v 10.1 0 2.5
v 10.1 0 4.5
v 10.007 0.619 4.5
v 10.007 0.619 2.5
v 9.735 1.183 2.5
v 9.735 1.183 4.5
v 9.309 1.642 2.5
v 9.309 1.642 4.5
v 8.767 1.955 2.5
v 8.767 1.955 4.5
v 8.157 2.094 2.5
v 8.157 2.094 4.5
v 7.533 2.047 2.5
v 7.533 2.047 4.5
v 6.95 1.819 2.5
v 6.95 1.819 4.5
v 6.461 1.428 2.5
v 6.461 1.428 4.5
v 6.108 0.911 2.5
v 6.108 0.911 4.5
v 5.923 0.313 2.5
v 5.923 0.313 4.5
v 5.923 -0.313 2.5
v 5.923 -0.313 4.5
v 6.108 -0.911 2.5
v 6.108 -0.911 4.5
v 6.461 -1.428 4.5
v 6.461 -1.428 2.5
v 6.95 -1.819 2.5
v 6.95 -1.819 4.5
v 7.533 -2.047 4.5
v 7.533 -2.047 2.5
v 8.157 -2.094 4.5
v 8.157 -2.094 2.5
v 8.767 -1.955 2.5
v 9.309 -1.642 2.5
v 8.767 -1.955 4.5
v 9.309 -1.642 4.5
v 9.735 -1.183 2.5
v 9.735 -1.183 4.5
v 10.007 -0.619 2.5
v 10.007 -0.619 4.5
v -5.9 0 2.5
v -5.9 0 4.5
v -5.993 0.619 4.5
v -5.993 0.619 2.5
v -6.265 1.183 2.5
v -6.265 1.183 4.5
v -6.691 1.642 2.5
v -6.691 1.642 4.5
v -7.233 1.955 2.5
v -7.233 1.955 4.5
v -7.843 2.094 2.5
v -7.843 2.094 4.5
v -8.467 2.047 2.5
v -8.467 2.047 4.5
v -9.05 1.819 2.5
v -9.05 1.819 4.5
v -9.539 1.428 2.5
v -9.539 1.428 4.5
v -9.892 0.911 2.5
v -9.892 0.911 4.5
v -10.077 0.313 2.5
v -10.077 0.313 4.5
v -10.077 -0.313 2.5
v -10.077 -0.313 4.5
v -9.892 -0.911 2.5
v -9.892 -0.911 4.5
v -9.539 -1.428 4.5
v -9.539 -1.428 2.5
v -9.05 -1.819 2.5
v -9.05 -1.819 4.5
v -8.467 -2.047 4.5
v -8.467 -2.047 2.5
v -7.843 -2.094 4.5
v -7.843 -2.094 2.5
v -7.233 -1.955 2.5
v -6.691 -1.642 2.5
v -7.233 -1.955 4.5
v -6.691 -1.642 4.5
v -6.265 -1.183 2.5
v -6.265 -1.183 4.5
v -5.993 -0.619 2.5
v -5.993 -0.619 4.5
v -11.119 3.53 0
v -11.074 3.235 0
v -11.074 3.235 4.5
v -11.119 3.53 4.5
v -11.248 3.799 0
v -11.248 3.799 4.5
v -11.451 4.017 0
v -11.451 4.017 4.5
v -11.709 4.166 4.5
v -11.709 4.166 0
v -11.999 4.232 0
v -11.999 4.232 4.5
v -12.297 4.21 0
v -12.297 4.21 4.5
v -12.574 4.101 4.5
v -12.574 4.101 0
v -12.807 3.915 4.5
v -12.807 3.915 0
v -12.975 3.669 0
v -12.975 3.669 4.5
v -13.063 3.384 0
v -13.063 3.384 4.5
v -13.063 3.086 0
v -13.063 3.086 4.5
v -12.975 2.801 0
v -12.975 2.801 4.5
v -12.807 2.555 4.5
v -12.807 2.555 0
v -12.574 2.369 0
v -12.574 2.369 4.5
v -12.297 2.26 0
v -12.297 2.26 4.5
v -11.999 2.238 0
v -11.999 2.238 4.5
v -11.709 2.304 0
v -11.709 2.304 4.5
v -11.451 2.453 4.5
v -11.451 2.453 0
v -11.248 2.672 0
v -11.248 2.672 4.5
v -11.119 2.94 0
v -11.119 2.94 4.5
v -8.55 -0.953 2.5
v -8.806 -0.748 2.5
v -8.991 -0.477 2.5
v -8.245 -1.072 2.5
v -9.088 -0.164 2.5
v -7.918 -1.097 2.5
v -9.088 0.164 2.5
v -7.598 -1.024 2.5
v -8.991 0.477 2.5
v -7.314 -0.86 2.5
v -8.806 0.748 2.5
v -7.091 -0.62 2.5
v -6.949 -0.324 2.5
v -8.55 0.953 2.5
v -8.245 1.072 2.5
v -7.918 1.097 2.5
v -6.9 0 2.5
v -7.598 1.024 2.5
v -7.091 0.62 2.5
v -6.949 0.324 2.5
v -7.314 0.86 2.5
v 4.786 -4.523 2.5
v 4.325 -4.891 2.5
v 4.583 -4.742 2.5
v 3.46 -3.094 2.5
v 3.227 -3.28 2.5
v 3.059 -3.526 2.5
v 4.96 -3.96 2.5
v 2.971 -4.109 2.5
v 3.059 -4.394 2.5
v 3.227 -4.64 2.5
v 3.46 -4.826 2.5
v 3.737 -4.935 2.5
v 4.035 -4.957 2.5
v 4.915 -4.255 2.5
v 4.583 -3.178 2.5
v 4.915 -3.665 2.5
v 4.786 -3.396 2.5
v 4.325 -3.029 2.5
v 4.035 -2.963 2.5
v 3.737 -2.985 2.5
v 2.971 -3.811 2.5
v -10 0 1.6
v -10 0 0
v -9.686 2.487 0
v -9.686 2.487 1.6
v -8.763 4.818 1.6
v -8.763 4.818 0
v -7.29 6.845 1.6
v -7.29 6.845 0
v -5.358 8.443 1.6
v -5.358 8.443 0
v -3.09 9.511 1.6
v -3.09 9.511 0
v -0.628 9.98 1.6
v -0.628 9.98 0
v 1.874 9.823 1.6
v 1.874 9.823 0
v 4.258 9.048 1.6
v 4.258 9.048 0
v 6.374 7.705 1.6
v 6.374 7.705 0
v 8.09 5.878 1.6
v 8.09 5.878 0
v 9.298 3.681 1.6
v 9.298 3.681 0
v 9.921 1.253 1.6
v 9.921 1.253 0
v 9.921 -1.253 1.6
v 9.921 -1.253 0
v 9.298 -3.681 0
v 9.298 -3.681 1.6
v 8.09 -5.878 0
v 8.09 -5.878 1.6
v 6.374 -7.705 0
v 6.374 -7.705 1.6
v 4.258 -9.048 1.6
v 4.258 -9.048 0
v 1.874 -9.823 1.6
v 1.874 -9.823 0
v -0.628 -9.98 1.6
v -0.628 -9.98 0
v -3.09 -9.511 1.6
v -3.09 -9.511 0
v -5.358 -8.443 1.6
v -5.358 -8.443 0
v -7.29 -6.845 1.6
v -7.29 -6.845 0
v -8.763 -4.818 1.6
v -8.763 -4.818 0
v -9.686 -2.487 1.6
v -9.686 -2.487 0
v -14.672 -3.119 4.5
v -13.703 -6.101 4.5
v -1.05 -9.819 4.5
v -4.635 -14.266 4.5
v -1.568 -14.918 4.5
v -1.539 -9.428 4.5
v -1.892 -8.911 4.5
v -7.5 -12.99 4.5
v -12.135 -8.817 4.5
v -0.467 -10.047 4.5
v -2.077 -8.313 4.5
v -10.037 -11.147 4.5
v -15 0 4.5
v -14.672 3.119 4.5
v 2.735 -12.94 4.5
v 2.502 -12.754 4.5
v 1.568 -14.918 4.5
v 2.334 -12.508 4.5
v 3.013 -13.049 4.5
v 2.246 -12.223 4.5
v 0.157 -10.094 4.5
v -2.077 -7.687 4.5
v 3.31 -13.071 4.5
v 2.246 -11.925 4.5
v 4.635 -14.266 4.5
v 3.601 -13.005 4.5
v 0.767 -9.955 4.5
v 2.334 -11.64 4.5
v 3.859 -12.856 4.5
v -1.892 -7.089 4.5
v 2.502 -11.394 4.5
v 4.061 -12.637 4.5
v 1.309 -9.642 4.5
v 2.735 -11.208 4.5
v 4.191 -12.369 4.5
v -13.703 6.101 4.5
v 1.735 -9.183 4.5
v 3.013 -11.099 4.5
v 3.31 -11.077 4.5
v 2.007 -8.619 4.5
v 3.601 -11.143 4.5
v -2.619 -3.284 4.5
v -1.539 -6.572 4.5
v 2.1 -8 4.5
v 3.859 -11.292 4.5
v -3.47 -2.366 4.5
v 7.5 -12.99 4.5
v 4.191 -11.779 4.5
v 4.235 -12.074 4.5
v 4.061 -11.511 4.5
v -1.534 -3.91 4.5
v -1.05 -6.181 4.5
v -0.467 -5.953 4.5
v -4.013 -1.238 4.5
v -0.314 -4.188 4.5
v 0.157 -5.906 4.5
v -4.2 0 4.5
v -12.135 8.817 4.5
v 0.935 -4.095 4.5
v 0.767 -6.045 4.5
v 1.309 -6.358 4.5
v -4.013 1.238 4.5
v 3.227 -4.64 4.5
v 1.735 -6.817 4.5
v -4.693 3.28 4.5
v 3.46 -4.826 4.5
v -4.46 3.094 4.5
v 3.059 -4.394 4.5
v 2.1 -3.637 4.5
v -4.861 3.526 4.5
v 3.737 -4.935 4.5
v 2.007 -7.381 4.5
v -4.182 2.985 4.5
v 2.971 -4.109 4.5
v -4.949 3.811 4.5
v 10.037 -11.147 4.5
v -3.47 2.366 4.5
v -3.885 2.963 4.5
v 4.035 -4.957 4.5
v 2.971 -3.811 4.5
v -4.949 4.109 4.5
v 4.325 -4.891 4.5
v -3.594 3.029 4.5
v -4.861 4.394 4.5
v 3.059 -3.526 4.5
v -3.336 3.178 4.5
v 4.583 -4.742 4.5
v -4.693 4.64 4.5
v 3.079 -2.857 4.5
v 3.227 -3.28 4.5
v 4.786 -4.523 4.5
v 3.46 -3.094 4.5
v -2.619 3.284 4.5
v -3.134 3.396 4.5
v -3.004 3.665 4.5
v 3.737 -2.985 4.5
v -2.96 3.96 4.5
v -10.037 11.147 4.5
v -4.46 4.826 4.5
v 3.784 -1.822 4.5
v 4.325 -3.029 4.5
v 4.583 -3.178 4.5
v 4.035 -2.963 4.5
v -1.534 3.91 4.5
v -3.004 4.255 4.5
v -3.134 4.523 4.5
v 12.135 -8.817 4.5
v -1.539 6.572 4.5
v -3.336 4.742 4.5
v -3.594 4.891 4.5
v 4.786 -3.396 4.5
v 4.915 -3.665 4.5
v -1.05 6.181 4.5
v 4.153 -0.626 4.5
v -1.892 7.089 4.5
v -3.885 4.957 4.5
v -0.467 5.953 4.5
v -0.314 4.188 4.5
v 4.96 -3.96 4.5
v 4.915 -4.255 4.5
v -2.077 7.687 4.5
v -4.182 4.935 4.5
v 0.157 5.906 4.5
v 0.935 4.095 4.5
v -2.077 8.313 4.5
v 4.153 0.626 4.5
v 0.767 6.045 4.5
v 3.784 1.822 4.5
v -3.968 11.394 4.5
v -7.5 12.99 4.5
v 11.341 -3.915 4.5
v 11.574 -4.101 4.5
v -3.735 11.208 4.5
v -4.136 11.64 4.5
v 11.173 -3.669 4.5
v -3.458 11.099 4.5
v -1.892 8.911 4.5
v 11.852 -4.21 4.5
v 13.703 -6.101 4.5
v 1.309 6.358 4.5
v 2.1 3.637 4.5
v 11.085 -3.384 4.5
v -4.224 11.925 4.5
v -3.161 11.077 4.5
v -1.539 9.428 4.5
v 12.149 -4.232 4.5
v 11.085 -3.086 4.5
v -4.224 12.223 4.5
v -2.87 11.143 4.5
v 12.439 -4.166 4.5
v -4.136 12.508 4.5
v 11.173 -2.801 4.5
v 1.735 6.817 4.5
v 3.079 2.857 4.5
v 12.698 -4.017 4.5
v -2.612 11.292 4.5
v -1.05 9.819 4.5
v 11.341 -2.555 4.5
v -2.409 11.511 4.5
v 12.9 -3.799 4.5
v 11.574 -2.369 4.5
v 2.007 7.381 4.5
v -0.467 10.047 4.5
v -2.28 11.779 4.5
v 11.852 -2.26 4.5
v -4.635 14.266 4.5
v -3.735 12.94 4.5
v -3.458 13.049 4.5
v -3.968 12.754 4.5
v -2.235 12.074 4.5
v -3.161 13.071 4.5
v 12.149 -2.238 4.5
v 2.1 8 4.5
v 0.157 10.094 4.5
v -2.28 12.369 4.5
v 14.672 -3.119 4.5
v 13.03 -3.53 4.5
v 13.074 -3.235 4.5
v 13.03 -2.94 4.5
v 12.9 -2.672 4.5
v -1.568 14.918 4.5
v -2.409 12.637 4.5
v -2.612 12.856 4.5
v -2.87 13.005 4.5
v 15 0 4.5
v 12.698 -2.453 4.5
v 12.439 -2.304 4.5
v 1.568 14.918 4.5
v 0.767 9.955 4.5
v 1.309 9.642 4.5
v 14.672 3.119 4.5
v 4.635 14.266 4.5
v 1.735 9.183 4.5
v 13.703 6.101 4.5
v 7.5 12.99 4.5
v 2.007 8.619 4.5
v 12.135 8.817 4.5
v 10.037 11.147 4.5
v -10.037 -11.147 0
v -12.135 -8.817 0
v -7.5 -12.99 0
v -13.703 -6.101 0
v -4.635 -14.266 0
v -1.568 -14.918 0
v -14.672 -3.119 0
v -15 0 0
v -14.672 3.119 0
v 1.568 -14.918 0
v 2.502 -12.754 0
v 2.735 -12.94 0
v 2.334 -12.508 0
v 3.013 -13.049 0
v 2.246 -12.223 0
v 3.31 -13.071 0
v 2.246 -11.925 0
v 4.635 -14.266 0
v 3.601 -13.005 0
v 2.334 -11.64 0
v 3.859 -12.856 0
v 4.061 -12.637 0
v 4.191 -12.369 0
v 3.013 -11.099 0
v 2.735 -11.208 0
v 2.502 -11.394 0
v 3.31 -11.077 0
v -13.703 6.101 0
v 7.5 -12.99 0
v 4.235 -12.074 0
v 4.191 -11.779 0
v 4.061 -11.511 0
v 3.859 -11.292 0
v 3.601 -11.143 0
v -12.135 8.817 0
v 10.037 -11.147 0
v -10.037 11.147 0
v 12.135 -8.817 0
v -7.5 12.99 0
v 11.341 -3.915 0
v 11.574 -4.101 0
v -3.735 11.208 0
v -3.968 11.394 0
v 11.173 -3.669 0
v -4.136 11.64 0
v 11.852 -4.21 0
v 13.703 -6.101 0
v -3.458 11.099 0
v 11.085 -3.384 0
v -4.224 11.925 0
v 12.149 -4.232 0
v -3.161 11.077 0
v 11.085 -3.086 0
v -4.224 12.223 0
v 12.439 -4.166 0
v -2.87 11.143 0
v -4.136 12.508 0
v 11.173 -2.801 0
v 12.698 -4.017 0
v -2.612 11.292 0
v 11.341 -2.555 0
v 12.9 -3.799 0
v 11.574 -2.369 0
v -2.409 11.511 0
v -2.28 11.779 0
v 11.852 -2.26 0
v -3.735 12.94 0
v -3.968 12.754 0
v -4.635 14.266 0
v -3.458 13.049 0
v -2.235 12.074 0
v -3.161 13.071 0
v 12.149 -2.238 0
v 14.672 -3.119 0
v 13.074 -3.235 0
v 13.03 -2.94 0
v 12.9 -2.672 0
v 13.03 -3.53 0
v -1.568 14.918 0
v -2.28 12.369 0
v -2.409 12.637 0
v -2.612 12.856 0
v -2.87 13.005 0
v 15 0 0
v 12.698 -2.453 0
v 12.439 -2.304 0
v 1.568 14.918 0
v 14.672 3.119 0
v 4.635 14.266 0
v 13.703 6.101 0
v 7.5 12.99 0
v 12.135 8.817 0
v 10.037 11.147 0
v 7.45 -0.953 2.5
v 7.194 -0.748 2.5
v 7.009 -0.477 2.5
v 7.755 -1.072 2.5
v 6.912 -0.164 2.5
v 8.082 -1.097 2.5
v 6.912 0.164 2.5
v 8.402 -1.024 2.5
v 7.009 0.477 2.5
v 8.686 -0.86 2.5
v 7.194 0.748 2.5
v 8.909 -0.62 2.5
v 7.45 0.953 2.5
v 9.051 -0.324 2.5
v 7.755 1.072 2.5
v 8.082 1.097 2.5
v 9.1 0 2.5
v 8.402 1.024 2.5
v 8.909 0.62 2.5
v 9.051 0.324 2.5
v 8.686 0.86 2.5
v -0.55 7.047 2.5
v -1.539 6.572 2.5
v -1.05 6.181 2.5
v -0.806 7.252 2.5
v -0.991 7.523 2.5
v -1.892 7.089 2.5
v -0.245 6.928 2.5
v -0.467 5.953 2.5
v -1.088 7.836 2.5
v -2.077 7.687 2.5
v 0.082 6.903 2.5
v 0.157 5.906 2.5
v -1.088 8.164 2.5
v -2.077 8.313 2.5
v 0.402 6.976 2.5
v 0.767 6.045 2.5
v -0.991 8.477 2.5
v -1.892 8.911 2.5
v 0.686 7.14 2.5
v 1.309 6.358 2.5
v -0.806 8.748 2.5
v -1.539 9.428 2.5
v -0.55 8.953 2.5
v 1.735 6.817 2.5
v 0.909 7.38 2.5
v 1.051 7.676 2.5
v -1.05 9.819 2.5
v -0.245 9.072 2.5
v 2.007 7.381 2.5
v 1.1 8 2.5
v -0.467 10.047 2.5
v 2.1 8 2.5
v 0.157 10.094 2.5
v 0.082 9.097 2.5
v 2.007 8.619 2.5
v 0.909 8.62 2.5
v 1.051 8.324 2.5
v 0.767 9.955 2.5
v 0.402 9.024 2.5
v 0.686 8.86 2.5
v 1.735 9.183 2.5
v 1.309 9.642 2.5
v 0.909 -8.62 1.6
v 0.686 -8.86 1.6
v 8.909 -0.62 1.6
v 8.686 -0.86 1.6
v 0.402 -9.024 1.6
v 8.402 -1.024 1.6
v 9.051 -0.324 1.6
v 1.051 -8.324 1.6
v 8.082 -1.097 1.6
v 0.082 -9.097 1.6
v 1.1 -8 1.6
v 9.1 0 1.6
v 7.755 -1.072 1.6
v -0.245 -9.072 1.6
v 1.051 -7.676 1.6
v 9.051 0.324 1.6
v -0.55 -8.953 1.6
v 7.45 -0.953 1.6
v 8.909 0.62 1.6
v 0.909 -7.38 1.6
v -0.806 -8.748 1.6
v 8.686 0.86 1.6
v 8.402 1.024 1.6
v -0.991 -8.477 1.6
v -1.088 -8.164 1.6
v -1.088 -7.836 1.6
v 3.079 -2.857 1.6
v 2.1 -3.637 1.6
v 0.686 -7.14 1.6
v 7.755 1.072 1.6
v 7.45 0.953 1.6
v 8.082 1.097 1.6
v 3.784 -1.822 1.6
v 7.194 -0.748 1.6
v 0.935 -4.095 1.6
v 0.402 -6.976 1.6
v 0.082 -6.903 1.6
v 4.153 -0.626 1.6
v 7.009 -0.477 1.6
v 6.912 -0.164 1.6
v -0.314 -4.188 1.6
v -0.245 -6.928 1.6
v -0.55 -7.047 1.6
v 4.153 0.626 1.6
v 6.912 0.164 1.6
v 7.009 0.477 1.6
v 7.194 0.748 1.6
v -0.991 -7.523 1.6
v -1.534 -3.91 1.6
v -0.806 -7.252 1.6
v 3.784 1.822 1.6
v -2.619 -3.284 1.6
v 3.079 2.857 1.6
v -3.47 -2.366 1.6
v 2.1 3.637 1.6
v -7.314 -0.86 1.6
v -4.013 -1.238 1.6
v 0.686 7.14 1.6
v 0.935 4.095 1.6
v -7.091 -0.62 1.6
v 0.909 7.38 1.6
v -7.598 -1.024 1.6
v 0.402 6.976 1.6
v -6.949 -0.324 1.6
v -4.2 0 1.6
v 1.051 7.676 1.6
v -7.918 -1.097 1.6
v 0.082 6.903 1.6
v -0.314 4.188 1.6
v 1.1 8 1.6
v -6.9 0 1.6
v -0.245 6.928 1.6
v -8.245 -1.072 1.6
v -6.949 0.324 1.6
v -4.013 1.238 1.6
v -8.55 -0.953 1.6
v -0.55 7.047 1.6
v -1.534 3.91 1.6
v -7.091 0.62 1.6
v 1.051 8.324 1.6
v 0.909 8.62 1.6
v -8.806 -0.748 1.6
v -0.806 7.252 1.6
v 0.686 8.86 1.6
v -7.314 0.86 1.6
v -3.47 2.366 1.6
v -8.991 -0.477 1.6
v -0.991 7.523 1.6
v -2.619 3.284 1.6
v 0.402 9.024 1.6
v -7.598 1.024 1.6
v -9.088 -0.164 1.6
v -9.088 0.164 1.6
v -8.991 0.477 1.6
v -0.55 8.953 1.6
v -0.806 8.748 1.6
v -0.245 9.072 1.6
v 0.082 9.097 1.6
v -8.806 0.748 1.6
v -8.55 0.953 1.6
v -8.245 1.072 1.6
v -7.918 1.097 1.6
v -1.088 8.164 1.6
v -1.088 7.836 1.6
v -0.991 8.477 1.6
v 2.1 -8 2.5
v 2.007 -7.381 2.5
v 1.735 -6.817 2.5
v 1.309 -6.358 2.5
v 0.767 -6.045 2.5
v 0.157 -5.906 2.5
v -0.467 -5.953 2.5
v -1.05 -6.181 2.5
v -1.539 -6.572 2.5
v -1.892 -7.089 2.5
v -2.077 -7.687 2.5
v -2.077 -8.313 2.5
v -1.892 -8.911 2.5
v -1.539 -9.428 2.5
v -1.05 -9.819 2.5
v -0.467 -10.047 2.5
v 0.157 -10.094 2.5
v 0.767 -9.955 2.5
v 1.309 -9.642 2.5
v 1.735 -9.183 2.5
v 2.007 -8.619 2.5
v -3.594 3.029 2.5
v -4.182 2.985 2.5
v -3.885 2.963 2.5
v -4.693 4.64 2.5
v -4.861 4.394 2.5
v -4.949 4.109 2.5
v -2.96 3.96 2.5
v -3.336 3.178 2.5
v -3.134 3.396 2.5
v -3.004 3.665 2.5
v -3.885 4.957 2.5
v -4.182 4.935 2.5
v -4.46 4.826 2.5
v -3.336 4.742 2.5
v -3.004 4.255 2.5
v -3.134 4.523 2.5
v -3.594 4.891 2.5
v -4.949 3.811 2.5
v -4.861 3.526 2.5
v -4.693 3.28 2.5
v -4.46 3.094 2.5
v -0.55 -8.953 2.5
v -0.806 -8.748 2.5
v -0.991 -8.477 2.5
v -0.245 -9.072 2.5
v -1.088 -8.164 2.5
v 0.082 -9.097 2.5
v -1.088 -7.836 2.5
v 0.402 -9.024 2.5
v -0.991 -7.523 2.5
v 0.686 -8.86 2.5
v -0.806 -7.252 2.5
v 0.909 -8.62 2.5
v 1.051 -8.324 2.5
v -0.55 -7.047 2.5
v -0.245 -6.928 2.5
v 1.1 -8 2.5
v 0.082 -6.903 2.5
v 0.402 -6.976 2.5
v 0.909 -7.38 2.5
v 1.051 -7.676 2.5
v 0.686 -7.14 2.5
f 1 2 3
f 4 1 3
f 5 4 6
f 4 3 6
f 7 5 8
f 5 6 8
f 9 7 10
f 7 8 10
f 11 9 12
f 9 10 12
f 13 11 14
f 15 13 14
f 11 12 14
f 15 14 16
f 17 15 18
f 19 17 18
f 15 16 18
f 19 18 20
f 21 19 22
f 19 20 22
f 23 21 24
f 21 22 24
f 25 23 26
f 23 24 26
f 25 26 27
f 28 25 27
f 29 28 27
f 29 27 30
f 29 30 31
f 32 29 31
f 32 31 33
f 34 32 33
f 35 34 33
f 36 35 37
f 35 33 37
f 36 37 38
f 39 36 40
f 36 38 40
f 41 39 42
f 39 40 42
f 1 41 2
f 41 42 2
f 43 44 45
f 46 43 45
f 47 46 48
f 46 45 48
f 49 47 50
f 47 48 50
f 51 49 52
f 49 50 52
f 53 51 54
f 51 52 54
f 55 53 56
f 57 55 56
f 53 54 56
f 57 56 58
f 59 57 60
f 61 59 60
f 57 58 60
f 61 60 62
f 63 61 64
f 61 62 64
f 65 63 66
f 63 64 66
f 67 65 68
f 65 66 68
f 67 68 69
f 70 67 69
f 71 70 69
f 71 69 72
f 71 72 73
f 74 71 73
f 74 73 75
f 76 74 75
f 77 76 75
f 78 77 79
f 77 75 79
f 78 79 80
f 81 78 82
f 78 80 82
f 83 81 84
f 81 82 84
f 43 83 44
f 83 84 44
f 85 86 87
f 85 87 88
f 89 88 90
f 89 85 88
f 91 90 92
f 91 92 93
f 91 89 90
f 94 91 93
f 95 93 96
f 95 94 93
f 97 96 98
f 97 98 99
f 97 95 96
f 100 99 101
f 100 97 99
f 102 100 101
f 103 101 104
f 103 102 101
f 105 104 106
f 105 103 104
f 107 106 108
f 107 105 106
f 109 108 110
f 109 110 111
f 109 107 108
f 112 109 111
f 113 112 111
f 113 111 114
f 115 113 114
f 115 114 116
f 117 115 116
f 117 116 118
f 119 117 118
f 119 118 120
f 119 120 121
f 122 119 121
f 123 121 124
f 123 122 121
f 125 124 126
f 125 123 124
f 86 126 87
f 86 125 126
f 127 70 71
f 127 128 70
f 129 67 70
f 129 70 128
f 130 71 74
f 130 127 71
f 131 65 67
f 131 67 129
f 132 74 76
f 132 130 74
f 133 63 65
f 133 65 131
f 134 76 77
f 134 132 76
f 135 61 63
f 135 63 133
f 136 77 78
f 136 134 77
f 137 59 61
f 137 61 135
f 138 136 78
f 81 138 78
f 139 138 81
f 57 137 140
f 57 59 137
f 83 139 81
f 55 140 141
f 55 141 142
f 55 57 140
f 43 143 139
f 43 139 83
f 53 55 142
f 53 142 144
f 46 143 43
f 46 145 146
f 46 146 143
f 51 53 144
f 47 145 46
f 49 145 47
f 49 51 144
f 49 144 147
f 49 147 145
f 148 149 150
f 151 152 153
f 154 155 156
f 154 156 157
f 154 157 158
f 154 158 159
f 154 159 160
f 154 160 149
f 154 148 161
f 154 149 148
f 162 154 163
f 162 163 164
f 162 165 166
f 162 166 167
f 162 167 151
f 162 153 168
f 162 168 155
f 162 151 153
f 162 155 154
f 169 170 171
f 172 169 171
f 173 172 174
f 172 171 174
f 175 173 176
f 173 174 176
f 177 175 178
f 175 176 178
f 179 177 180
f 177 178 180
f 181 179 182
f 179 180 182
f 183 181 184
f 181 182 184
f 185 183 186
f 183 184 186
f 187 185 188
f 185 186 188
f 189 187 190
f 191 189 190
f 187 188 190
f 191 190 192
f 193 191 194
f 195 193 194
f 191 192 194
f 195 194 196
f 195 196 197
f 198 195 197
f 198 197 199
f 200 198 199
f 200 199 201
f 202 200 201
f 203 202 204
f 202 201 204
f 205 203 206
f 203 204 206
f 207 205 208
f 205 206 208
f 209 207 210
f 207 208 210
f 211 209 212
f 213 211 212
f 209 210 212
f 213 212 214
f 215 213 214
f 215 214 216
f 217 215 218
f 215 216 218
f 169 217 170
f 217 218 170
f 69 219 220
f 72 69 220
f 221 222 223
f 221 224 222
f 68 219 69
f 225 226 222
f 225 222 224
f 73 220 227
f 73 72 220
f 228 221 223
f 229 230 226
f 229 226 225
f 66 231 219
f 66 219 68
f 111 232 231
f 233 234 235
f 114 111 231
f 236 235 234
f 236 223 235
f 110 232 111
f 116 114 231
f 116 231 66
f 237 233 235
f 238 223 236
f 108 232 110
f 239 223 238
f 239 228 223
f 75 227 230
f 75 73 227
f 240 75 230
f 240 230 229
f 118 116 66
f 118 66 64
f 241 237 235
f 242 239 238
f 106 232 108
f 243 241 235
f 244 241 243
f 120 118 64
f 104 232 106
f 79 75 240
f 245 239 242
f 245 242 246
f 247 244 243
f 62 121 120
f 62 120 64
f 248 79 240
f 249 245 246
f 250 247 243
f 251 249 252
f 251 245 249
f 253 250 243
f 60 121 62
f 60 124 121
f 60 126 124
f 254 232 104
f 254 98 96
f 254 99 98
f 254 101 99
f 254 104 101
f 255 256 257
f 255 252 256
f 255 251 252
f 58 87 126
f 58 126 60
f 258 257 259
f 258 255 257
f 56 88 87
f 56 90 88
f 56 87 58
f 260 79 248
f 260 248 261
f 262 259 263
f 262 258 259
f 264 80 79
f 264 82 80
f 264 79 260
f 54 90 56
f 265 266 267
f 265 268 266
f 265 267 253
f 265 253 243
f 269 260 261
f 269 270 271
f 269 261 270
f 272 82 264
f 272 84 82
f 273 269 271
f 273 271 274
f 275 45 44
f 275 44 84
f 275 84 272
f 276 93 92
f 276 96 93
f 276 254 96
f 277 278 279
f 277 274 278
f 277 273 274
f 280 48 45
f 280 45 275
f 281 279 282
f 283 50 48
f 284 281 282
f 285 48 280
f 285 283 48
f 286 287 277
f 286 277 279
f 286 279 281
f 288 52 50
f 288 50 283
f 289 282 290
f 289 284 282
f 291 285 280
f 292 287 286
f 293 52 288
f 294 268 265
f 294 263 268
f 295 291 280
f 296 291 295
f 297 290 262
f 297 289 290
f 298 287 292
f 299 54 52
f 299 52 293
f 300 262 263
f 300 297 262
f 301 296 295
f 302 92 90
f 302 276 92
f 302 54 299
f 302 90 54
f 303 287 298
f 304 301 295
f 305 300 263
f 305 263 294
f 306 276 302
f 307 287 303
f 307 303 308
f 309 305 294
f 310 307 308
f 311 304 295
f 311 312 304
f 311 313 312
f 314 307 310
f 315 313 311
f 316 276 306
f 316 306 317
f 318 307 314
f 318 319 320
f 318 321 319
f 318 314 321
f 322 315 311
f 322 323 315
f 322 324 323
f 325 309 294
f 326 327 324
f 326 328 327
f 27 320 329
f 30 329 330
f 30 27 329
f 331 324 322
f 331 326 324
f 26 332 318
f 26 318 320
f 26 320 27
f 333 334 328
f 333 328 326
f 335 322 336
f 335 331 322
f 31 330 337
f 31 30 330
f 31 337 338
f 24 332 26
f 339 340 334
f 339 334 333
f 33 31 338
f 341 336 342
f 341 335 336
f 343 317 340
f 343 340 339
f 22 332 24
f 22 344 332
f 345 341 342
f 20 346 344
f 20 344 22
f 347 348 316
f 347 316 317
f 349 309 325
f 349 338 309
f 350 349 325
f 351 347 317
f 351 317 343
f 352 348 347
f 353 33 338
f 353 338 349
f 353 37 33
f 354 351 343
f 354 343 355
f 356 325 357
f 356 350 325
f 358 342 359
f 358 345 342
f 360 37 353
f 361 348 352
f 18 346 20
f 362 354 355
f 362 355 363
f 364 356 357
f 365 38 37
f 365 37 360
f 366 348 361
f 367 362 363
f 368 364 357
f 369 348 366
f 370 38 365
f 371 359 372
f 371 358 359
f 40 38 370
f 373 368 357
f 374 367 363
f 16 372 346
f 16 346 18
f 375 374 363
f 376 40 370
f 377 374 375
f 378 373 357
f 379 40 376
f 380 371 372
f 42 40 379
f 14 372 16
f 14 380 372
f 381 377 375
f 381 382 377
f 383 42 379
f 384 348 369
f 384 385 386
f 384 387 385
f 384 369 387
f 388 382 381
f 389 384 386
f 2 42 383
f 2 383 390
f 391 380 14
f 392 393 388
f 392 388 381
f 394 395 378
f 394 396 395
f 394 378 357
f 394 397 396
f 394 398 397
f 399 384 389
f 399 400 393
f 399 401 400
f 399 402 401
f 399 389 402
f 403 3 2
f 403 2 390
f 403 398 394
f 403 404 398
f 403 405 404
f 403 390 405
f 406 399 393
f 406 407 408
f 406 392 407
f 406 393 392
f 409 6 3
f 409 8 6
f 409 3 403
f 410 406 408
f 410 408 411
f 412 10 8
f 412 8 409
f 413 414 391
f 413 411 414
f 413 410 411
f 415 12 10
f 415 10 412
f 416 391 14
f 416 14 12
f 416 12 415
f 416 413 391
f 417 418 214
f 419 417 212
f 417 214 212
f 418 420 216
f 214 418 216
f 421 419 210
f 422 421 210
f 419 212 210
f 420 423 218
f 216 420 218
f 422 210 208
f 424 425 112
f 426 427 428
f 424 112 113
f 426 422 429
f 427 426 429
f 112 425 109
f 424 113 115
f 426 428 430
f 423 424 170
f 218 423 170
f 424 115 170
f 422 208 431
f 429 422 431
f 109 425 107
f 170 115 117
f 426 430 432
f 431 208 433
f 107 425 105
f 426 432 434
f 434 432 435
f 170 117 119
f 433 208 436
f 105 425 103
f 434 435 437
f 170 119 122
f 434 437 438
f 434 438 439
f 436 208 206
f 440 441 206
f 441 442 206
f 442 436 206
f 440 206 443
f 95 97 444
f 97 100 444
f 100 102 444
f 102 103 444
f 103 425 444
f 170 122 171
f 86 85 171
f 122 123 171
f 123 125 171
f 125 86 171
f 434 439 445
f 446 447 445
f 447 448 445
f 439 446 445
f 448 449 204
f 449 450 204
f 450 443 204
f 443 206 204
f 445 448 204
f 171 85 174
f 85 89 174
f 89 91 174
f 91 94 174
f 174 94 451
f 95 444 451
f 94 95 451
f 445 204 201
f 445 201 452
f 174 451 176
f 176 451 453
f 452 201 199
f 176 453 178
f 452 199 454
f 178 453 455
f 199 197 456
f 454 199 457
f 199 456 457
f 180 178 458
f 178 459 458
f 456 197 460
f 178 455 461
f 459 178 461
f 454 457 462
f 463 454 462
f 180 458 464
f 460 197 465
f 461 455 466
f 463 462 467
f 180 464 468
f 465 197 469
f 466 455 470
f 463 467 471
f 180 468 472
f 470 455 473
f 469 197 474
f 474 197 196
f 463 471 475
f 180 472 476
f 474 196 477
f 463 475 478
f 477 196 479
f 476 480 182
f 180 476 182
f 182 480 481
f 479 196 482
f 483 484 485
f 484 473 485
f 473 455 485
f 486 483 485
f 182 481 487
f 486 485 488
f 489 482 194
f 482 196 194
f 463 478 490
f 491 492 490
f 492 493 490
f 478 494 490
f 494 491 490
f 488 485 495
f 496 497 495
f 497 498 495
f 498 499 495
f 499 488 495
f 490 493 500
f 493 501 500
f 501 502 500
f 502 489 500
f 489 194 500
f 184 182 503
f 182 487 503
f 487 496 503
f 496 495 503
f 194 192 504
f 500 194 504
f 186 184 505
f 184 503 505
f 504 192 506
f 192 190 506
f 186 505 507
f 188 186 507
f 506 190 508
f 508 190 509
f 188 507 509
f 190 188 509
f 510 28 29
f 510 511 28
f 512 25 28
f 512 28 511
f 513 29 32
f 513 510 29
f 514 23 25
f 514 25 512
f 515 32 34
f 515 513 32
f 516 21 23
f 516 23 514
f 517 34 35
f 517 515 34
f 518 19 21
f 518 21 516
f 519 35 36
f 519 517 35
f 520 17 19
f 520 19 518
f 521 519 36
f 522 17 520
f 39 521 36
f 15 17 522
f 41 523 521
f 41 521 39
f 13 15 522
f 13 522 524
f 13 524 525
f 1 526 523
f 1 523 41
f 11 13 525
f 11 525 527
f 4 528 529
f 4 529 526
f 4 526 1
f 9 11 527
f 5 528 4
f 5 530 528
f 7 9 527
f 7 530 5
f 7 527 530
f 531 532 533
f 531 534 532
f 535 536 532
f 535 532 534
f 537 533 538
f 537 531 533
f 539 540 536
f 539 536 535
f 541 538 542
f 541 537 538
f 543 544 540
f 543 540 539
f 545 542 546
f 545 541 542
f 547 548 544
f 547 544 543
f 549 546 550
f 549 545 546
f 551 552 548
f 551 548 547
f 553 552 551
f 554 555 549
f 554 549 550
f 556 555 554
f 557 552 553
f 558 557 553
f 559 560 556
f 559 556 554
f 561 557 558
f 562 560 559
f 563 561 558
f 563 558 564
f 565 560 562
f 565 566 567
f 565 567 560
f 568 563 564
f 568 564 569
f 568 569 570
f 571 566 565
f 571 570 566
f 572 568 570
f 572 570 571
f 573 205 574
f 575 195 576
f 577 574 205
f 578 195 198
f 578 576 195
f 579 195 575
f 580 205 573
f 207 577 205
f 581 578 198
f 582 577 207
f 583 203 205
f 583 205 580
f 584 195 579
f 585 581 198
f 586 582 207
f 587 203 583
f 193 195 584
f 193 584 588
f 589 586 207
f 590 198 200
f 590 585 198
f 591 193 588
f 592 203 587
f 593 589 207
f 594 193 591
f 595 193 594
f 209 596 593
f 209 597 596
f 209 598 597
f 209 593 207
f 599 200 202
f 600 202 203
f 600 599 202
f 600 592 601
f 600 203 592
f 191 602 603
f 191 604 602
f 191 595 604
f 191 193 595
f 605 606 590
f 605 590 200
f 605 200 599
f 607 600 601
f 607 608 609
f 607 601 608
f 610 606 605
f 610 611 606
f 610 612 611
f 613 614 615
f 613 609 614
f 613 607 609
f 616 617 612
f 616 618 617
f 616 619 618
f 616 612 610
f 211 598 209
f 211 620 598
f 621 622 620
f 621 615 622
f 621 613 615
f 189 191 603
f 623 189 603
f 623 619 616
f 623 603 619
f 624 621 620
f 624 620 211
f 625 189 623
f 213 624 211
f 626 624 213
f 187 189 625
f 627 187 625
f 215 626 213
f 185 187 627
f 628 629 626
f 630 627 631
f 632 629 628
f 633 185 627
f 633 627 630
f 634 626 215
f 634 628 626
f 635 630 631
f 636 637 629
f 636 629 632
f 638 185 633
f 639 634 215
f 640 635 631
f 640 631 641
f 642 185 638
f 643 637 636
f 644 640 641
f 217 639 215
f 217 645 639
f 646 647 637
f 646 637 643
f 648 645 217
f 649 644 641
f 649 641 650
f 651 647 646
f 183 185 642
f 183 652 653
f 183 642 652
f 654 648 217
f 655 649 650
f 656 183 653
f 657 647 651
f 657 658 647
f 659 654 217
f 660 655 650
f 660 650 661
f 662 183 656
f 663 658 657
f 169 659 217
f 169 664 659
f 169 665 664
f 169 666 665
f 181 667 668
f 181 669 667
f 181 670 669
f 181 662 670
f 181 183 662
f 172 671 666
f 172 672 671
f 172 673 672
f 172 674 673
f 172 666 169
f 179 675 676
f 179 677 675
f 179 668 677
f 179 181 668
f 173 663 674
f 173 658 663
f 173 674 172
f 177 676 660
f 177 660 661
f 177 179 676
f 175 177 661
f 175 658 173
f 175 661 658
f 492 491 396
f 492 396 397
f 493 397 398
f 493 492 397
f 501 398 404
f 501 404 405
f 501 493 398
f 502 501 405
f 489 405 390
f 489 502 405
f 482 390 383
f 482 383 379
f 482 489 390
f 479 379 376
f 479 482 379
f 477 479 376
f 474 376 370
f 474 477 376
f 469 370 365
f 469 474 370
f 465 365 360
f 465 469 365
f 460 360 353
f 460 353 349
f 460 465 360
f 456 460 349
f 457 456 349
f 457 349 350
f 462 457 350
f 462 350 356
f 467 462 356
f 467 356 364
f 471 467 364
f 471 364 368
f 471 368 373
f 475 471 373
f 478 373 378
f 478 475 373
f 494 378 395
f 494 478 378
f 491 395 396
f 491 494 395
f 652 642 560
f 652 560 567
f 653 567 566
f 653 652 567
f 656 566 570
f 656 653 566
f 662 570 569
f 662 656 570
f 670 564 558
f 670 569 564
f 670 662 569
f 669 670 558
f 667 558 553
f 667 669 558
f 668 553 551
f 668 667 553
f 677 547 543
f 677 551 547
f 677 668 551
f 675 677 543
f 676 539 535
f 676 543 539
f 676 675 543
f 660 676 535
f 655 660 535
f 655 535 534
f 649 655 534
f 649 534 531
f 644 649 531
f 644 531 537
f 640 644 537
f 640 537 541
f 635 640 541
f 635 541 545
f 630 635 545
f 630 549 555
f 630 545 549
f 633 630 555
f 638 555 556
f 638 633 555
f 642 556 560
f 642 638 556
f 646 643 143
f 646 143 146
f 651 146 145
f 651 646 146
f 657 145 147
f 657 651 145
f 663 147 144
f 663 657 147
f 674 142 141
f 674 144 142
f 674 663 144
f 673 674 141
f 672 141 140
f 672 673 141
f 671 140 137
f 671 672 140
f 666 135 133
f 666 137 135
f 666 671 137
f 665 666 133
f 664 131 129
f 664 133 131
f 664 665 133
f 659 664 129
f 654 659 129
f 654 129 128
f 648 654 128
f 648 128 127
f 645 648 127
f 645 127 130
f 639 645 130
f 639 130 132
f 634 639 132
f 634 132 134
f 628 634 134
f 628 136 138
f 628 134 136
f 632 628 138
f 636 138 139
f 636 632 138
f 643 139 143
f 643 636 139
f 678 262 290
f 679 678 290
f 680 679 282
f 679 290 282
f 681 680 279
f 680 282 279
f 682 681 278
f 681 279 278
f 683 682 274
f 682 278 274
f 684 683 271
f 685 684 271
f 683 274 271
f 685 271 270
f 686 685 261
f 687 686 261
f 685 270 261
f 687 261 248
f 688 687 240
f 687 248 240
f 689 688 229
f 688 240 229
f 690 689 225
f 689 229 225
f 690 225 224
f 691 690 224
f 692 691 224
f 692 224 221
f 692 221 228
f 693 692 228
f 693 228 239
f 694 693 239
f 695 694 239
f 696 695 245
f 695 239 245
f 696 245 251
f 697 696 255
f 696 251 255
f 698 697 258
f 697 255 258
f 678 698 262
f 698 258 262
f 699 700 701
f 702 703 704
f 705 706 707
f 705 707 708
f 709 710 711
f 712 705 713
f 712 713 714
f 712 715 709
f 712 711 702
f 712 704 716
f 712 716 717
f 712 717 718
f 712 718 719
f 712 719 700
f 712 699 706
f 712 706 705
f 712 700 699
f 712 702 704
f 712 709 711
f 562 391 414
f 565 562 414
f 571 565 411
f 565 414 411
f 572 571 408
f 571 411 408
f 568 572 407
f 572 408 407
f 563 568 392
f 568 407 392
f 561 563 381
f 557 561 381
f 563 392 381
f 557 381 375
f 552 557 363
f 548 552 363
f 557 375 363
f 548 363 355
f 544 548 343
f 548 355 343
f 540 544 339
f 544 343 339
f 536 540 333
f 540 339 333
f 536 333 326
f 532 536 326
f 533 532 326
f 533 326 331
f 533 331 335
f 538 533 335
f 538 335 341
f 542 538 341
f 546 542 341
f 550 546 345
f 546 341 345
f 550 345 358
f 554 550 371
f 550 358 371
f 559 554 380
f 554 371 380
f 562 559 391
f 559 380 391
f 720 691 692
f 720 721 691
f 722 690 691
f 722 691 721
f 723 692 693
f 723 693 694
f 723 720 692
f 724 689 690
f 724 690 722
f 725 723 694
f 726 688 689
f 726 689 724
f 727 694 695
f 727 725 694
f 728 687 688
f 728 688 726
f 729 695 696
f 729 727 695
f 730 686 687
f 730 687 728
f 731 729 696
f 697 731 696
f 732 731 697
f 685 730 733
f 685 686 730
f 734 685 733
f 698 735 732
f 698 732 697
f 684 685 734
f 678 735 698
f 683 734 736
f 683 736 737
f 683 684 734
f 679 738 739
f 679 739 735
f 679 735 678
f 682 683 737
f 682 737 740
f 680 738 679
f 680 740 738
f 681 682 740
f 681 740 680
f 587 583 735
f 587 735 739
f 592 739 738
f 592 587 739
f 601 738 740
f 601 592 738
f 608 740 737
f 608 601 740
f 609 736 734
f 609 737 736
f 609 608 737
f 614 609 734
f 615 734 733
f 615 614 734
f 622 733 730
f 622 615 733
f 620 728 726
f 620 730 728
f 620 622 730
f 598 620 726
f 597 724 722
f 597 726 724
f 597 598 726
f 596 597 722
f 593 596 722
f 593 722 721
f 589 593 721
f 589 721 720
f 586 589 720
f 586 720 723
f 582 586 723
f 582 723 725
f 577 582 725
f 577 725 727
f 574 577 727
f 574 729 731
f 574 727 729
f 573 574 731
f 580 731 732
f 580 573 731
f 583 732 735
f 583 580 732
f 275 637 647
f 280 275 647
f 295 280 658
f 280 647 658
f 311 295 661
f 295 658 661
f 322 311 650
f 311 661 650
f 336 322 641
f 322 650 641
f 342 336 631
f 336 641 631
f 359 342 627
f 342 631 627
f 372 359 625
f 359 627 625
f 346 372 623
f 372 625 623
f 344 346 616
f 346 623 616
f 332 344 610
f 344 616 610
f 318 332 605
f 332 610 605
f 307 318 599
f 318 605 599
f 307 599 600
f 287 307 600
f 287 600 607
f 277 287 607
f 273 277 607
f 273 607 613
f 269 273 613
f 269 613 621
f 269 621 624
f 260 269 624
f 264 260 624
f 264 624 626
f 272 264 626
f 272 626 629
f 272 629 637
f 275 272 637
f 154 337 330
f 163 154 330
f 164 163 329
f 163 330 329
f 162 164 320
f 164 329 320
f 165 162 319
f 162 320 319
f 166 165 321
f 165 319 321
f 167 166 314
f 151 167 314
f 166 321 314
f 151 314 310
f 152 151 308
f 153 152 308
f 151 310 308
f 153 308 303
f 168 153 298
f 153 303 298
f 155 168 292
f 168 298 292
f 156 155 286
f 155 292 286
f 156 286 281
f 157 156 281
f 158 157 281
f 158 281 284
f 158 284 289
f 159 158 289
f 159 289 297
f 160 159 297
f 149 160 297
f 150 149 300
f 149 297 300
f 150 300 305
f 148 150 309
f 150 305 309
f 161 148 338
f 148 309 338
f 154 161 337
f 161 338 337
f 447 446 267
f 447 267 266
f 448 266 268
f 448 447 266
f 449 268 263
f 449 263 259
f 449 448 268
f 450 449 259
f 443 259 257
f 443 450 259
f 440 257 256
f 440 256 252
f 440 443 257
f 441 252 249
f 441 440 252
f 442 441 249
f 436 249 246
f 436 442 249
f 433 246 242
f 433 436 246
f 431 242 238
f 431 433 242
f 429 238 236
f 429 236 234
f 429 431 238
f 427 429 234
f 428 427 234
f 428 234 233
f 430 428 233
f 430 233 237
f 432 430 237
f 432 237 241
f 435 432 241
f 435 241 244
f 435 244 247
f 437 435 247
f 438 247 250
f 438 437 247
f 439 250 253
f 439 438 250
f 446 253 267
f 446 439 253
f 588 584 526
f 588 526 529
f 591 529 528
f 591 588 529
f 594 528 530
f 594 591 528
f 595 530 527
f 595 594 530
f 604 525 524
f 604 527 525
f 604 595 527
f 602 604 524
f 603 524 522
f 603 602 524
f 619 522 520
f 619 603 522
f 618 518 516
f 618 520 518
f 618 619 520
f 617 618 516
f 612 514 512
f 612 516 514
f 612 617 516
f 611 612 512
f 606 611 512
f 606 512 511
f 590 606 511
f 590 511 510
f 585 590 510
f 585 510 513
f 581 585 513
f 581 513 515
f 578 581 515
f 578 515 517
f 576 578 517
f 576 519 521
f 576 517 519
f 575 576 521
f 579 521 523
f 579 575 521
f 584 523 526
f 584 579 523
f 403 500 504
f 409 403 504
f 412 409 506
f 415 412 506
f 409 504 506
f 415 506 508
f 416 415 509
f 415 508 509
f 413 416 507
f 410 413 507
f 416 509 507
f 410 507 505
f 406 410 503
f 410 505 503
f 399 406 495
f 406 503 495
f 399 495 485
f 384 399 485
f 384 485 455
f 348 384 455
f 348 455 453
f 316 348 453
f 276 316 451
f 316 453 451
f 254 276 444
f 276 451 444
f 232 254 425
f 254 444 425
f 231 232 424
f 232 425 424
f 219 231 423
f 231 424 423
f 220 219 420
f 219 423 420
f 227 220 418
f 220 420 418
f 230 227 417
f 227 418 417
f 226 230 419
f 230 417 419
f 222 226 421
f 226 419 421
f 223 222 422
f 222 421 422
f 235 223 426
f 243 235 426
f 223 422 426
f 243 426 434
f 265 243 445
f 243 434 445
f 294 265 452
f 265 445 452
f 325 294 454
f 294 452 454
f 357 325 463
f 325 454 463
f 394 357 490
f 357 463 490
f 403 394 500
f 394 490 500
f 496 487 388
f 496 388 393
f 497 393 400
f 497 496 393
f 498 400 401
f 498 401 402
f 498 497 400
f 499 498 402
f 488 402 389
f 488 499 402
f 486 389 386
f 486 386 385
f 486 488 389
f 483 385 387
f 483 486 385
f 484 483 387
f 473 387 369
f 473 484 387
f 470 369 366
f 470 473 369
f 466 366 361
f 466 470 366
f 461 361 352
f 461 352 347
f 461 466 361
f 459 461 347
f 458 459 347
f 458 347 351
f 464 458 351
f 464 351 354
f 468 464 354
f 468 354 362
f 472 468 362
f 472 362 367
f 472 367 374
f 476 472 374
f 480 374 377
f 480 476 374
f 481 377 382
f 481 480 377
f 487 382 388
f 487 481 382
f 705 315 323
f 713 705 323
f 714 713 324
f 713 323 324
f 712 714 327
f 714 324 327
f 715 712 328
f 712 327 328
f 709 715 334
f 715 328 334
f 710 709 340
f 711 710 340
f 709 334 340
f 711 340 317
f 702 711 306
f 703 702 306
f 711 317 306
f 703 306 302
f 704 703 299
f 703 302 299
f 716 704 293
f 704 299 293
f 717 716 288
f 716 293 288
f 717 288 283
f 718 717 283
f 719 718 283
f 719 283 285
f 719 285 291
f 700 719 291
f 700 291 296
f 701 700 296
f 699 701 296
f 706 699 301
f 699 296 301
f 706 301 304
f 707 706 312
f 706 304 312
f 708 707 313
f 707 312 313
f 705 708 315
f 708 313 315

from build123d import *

# Parameters (mm, degrees)
SKETCH_1_R          = 15
SKETCH_1_R_2        = 2.3
SKETCH_1_R_3        = 1.1
SKETCH_1_R_4        = 1
EXTRUDE_1_DEPTH     = 4.5
SKETCH_2_R          = 2.1
CUT_EXTRUDE_1_DEPTH = 2
SKETCH_10_R         = 10
CUT_EXTRUDE_7_DEPTH = 1.6
SKETCH_9_R          = 4.2
CUT_EXTRUDE_5_DEPTH = 3.9
SKETCH_6_R          = 1
CUT_EXTRUDE_6_DEPTH = 2


with BuildPart() as part:
    # 스케치1 → 보스-돌출1 (new body)
    with BuildSketch(Plane.XY):
        Circle(SKETCH_1_R)
        Circle(SKETCH_1_R_2, mode=Mode.SUBTRACT)
        with Locations((0, 8)):
            Circle(SKETCH_1_R_3, mode=Mode.SUBTRACT)
        with Locations((8, 0)):
            Circle(SKETCH_1_R_3, mode=Mode.SUBTRACT)
        with Locations((0, -8)):
            Circle(SKETCH_1_R_3, mode=Mode.SUBTRACT)
        with Locations((-8, 0)):
            Circle(SKETCH_1_R_3, mode=Mode.SUBTRACT)
        with Locations((-3.235238064, 12.074072829)):
            Circle(SKETCH_1_R_4, mode=Mode.SUBTRACT)
        with Locations((12.074072829, -3.235238064)):
            Circle(SKETCH_1_R_4, mode=Mode.SUBTRACT)
        with Locations((3.235238064, -12.074072829)):
            Circle(SKETCH_1_R_4, mode=Mode.SUBTRACT)
        with Locations((-12.074072829, 3.235238064)):
            Circle(SKETCH_1_R_4, mode=Mode.SUBTRACT)
    extrude(amount=EXTRUDE_1_DEPTH)

    # 스케치2 → 컷-돌출1 (cut)
    with BuildSketch(Plane.XY.offset(4.5)):
        with Locations((0, 8)):
            Circle(SKETCH_2_R)
        with Locations((8, 0)):
            Circle(SKETCH_2_R)
        with Locations((0, -8)):
            Circle(SKETCH_2_R)
        with Locations((-8, 0)):
            Circle(SKETCH_2_R)
    extrude(amount=-CUT_EXTRUDE_1_DEPTH, mode=Mode.SUBTRACT)

    # 스케치10 → 컷-돌출7 (cut)
    with BuildSketch(Plane(origin=(0, 0, 0), x_dir=(-1, 0, 0), z_dir=(0, 0, -1))):
        Circle(SKETCH_10_R)
    extrude(amount=-CUT_EXTRUDE_7_DEPTH, mode=Mode.SUBTRACT)

    # 스케치9 → 컷-돌출5 (cut, through all)
    with BuildSketch(Plane(origin=(0, 0, 1.6), x_dir=(-1, 0, 0), z_dir=(0, 0, -1))):
        Circle(SKETCH_9_R)
    extrude(amount=-CUT_EXTRUDE_5_DEPTH, mode=Mode.SUBTRACT)

    # 스케치6 → 컷-돌출6 (cut)
    with BuildSketch(Plane.XY.offset(4.5)):
        with Locations((-3.959797975, 3.959797975)):
            Circle(SKETCH_6_R)
        with Locations((3.959797975, -3.959797975)):
            Circle(SKETCH_6_R)
    extrude(amount=-CUT_EXTRUDE_6_DEPTH, mode=Mode.SUBTRACT)


solid = part.part
